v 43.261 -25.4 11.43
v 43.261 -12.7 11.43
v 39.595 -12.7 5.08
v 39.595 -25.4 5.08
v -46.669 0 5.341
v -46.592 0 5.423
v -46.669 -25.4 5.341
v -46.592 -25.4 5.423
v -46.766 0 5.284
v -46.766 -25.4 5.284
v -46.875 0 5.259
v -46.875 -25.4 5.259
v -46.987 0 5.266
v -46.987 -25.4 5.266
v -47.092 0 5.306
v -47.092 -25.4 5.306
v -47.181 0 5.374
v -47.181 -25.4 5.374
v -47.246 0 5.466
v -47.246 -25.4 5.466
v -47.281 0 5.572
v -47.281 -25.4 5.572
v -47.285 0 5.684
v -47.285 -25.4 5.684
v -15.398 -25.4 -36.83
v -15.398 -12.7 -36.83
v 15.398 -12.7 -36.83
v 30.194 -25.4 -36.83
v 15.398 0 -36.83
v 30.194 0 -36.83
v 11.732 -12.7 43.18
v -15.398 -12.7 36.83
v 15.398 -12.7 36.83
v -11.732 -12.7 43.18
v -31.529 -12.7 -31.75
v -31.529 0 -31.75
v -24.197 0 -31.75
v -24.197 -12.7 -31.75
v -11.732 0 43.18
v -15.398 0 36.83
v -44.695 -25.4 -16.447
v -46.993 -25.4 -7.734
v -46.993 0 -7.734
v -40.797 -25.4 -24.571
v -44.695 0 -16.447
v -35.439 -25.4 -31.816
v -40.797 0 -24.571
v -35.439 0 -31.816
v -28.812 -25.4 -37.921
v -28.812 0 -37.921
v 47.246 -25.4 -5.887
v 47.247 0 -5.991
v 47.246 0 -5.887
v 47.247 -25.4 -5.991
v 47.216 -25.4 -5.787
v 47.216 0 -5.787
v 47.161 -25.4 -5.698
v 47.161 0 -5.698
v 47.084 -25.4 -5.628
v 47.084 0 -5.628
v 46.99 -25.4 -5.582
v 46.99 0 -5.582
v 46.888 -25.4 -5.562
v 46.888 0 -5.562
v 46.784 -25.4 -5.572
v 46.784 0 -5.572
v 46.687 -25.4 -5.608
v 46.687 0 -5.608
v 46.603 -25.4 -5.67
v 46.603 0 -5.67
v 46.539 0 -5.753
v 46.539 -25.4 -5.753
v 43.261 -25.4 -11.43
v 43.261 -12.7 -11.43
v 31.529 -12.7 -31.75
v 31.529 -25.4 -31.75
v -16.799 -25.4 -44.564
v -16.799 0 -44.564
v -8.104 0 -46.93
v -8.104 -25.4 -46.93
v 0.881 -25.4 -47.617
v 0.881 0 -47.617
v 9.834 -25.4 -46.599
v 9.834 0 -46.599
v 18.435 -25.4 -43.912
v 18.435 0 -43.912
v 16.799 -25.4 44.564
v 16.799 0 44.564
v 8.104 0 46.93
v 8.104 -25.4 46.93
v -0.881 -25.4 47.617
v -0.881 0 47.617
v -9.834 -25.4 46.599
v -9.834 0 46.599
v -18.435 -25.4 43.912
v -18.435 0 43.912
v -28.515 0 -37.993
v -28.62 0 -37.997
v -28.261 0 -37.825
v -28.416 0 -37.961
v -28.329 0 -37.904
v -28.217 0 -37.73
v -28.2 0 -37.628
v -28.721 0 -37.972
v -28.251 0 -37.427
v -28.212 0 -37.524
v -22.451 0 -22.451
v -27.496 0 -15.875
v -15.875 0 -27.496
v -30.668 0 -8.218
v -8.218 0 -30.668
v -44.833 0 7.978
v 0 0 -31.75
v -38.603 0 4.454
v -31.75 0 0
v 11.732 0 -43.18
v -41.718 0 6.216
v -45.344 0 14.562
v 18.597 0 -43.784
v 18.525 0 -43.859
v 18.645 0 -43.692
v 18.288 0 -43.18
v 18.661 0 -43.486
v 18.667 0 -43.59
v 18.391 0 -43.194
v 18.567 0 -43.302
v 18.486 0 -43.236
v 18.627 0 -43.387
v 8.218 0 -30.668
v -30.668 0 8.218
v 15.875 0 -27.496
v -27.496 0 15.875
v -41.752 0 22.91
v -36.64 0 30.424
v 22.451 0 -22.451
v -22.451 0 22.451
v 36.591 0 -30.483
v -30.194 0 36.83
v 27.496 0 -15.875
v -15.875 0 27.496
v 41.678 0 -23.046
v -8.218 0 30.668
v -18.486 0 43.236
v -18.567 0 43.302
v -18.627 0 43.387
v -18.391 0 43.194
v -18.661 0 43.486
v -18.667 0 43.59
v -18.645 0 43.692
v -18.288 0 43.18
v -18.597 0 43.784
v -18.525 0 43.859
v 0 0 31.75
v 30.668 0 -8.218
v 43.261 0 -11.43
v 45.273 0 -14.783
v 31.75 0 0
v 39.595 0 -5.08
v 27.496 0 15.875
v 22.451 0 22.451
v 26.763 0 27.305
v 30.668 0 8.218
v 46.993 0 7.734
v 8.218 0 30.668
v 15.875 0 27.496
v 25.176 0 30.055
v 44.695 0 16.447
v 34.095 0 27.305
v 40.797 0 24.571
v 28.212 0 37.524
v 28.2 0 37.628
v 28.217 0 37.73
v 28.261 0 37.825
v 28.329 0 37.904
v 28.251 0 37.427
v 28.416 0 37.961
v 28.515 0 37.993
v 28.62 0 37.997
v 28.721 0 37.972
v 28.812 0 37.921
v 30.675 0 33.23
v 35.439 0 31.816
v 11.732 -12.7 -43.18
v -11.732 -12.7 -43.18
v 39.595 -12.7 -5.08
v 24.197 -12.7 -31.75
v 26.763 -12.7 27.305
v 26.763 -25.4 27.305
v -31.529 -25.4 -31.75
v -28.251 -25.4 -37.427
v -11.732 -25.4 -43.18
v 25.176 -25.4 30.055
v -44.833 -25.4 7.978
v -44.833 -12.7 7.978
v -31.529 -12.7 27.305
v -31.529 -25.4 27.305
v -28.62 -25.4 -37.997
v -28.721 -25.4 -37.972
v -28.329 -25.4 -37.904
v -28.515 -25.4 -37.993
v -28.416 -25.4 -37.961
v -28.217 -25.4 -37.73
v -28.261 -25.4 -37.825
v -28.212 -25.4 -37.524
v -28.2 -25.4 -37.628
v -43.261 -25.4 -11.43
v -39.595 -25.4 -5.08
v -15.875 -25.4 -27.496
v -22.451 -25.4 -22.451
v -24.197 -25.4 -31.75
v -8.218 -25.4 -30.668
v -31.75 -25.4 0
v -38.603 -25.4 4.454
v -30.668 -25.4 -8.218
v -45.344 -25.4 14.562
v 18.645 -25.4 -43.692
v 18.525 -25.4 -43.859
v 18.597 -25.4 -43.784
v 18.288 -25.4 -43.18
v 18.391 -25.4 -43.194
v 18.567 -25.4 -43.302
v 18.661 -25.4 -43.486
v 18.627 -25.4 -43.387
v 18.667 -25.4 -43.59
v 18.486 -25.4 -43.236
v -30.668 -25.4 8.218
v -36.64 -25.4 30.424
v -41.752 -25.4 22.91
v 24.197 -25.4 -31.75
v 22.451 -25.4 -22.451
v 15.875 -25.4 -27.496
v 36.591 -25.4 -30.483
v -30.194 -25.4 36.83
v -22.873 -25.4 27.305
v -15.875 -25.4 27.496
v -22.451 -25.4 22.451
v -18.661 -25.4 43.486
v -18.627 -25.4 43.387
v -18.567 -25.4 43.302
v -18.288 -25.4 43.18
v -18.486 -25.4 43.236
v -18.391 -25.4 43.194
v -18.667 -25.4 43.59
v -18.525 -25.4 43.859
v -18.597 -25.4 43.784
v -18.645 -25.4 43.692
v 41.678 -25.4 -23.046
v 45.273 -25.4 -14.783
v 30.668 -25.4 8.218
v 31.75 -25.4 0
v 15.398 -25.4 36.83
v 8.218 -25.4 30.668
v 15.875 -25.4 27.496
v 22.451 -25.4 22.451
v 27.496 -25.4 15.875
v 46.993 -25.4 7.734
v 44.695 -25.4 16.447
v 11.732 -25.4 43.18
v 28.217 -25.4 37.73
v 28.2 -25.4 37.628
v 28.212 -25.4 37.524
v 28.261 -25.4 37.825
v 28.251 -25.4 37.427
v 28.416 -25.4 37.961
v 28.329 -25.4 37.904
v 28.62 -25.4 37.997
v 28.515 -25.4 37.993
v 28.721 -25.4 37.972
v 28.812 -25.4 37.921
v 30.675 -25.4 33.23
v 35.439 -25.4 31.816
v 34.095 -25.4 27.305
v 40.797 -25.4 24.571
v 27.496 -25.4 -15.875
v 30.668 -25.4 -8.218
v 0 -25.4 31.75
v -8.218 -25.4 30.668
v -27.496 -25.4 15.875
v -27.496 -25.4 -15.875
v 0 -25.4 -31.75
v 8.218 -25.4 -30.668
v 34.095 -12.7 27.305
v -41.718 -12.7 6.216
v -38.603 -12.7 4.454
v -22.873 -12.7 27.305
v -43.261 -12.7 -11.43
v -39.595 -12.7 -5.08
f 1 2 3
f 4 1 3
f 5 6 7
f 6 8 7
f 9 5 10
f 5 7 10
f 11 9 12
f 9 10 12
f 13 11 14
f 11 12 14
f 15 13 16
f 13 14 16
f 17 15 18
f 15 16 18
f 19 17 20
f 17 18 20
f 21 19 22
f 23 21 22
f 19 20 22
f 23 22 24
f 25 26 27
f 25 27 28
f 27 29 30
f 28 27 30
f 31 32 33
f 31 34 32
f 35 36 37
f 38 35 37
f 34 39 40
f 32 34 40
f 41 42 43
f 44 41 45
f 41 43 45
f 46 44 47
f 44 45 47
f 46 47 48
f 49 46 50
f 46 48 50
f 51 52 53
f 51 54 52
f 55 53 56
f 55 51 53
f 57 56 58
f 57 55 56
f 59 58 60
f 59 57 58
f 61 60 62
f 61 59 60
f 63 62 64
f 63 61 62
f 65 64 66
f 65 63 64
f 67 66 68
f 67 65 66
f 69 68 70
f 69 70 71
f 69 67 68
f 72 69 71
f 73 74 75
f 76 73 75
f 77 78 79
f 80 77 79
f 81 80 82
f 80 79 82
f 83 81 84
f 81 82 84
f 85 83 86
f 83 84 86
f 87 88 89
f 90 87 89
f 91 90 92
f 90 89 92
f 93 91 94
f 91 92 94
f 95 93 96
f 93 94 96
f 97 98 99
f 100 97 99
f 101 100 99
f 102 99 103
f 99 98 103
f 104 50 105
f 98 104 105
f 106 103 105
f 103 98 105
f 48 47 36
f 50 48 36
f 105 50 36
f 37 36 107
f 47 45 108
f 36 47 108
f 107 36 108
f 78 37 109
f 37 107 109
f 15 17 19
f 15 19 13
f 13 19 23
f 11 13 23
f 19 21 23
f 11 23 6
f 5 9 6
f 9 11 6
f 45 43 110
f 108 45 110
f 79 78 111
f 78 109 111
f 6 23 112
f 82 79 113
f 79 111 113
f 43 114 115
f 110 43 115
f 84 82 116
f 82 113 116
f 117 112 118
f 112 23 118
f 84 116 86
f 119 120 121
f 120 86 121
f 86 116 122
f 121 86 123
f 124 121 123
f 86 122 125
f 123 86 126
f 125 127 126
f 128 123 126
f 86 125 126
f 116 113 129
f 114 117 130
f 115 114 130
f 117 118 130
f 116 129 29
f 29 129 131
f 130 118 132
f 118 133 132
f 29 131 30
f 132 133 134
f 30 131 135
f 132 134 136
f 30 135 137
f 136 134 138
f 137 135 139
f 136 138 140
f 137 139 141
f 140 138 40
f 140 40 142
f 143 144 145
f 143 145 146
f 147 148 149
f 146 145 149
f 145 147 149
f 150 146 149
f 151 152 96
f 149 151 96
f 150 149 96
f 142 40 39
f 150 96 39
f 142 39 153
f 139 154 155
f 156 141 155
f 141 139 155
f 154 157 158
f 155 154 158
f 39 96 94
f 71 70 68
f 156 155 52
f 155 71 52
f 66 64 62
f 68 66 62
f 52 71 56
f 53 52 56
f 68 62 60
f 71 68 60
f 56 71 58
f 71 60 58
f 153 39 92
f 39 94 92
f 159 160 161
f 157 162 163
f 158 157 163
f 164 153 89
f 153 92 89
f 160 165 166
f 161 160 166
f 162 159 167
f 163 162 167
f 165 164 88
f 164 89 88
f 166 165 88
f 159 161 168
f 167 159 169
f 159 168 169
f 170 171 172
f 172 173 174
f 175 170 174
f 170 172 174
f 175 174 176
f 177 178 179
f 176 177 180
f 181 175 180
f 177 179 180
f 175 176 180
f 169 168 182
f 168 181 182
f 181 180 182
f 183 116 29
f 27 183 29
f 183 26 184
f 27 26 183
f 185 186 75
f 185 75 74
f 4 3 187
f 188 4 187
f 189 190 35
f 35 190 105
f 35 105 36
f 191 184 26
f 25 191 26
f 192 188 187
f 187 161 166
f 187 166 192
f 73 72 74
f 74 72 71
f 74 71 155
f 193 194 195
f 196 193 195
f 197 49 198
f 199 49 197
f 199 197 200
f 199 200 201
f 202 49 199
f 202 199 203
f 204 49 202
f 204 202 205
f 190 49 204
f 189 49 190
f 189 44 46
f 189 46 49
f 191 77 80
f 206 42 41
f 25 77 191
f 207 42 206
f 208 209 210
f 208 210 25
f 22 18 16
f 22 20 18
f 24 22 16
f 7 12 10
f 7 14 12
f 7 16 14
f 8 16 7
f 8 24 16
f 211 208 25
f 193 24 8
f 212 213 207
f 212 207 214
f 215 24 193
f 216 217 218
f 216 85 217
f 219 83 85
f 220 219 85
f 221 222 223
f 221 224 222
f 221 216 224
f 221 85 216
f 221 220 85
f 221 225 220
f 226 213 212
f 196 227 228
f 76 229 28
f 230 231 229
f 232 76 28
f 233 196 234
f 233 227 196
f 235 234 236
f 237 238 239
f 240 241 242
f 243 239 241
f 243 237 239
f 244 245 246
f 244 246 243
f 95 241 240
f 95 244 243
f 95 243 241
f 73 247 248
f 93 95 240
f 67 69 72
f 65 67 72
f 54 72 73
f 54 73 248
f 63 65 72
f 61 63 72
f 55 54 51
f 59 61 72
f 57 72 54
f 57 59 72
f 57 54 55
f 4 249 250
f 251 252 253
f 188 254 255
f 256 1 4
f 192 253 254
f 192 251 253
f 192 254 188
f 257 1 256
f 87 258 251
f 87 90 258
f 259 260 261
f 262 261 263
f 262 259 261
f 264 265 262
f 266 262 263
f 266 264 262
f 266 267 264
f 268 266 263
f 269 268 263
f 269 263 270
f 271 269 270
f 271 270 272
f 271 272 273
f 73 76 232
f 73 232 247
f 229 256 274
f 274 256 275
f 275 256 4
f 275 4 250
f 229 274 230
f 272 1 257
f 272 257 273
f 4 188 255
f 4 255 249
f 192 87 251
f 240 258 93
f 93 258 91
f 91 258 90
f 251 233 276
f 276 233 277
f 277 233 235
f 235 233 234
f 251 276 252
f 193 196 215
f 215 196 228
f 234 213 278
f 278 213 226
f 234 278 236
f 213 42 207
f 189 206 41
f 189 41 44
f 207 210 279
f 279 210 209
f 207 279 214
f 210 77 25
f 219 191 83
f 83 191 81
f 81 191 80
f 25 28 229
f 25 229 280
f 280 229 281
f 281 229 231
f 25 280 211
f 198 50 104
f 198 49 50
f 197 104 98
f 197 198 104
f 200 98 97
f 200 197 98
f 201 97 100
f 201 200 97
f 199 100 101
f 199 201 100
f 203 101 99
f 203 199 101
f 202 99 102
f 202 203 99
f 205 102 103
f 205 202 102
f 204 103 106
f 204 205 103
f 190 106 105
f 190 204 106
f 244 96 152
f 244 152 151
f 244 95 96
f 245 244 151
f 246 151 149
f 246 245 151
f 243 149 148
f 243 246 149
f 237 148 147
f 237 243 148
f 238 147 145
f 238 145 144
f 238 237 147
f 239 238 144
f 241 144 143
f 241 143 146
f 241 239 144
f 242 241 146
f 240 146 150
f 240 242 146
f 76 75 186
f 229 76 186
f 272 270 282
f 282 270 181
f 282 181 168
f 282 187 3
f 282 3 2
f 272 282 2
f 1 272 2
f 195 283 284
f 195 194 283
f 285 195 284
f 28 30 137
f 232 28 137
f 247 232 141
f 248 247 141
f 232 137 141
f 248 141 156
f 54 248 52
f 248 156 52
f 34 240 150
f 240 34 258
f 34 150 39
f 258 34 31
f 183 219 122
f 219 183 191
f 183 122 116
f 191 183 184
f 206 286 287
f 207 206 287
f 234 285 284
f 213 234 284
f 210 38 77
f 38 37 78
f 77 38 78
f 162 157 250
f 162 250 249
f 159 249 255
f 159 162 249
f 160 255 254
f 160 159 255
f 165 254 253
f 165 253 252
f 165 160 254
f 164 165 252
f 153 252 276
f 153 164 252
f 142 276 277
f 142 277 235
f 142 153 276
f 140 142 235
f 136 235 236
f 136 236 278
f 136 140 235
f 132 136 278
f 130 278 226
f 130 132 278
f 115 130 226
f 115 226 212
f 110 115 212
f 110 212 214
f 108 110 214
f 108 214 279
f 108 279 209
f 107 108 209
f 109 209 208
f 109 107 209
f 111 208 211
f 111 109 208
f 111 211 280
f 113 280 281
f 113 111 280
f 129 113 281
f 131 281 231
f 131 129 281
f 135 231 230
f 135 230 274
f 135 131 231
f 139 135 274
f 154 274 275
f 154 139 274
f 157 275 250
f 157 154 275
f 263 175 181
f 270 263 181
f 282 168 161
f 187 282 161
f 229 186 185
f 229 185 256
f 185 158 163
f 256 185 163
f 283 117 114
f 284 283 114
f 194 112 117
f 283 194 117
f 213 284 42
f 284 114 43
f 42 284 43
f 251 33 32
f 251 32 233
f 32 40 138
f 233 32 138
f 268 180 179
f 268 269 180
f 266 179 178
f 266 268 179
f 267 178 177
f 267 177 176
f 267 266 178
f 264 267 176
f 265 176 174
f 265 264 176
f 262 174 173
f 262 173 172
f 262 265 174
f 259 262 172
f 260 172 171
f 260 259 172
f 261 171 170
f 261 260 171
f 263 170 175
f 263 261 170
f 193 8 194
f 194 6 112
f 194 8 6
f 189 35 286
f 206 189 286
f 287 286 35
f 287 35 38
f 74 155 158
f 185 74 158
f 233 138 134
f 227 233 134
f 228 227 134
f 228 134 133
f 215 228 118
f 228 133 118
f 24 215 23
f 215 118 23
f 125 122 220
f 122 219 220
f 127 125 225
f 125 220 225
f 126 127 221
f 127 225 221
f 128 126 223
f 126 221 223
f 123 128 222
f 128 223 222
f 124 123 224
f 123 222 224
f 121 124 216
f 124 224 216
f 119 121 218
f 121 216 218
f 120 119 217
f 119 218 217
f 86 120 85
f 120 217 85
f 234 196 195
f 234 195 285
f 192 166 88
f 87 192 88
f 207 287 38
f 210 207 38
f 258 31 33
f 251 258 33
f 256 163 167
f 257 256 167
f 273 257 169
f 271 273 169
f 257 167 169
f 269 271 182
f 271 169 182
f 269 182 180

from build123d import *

# Parameters (mm, degrees)
F0_R     = 31.75
F1_DEPTH = 25.4
F2_DEPTH = 12.7
F3_R     = 0.381


# Not quite as in the source:
# - a feature names something its author has since deleted; it is built from what else it names


with BuildPart() as f1:
    # F0 (on Front) → F1 (new body)
    with BuildSketch(Plane.XZ):
        with BuildLine():
            Line((15.3979316793, -36.83), (30.194233307, -36.83))
            ThreePointArc((30.194233307, -36.83), (42.108212504, -22.2494733583), (47.4402273678, -4.1911158763))
            Line((47.4402273678, -4.1911158763), (43.2608556704, -11.43))
            Line((43.2608556704, -11.43), (31.5290982004, -31.75))
            Line((31.5290982004, -31.75), (27.8629239911, -31.75))
            Line((27.8629239911, -31.75), (24.1967497817, -31.75))
            Line((24.1967497817, -31.75), (39.594681461, -5.08))
            Line((39.594681461, -5.08), (46.9928322749, 7.7339730917))
            ThreePointArc((46.9928322749, 7.7339730917), (40.3227154011, 25.3420450573), (27.349726503, 38.9888841237))
            Line((27.349726503, 38.9888841237), (30.6748353416, 33.2296266746))
            Line((30.6748353416, 33.2296266746), (34.095420147, 27.305))
            Line((34.095420147, 27.305), (43.2608556704, 11.43))
            Line((43.2608556704, 11.43), (41.4277685657, 8.255))
            Line((41.4277685657, 8.255), (39.594681461, 5.08))
            Line((39.594681461, 5.08), (26.7630717283, 27.305))
            Line((26.7630717283, 27.305), (25.1755740867, 30.0546265722))
            Line((25.1755740867, 30.0546265722), (16.7985989679, 44.5639730917))
            ThreePointArc((16.7985989679, 44.5639730917), (-1.7854971029, 47.5915184155), (-20.0905008648, 43.18))
            Line((-20.0905008648, 43.18), (-11.7317574699, 43.18))
            Line((-11.7317574699, 43.18), (11.7317574699, 43.18))
            Line((11.7317574699, 43.18), (13.5648445746, 40.005))
            Line((13.5648445746, 40.005), (15.3979316793, 36.83))
            Line((15.3979316793, 36.83), (-15.3979316793, 36.83))
            Line((-15.3979316793, 36.83), (-30.194233307, 36.83))
            ThreePointArc((-30.194233307, 36.83), (-42.108212504, 22.2494733583), (-47.4402273678, 4.1911158763))
            Line((-47.4402273678, 4.1911158763), (-44.833398728, 7.9780209084))
            Line((-44.833398728, 7.9780209084), (-31.5290982004, 27.305))
            Line((-31.5290982004, 27.305), (-27.2009059294, 27.305))
            Line((-27.2009059294, 27.305), (-22.8727136583, 27.305))
            Line((-22.8727136583, 27.305), (-38.6030217944, 4.4537921653))
            Line((-38.6030217944, 4.4537921653), (-46.9928322749, -7.7339730917))
            ThreePointArc((-46.9928322749, -7.7339730917), (-40.3227154011, -25.3420450573), (-27.349726503, -38.9888841237))
            Line((-27.349726503, -38.9888841237), (-31.5290982004, -31.75))
            Line((-31.5290982004, -31.75), (-43.2608556704, -11.43))
            Line((-43.2608556704, -11.43), (-41.4277685657, -8.255))
            Line((-41.4277685657, -8.255), (-39.594681461, -5.08))
            Line((-39.594681461, -5.08), (-24.1967497817, -31.75))
            Line((-24.1967497817, -31.75), (-16.7985989679, -44.5639730917))
            ThreePointArc((-16.7985989679, -44.5639730917), (1.7854971029, -47.5915184155), (20.0905008648, -43.18))
            Line((20.0905008648, -43.18), (11.7317574699, -43.18))
            Line((11.7317574699, -43.18), (-11.7317574699, -43.18))
            Line((-11.7317574699, -43.18), (-13.5648445746, -40.005))
            Line((-13.5648445746, -40.005), (-15.3979316793, -36.83))
            Line((-15.3979316793, -36.83), (15.3979316793, -36.83))
        make_face()
        Circle(F0_R, mode=Mode.SUBTRACT)
    extrude(amount=F1_DEPTH)

    # F0 (on Front) → F2 (join)
    with BuildSketch(Plane.XZ):
        Polygon((-41.7182102612, 6.2159065369), (-38.6030217944, 4.4537921653), (-22.8727136583, 27.305), (-27.2009059294, 27.305), align=None)
        Polygon((-44.833398728, 7.9780209084), (-41.7182102612, 6.2159065369), (-27.2009059294, 27.305), (-31.5290982004, 27.305), align=None)
        Polygon((-27.8629239911, -31.75), (-24.1967497817, -31.75), (-39.594681461, -5.08), (-41.4277685657, -8.255), align=None)
        Polygon((-31.5290982004, -31.75), (-27.8629239911, -31.75), (-41.4277685657, -8.255), (-43.2608556704, -11.43), align=None)
        Polygon((13.5648445746, -40.005), (15.3979316793, -36.83), (-15.3979316793, -36.83), (-13.5648445746, -40.005), align=None)
        Polygon((11.7317574699, -43.18), (13.5648445746, -40.005), (-13.5648445746, -40.005), (-11.7317574699, -43.18), align=None)
        Polygon((27.8629239911, -31.75), (41.4277685657, -8.255), (39.594681461, -5.08), (24.1967497817, -31.75), align=None)
        Polygon((31.5290982004, -31.75), (43.2608556704, -11.43), (41.4277685657, -8.255), (27.8629239911, -31.75), align=None)
        Polygon((43.2608556704, 11.43), (34.095420147, 27.305), (30.4292459376, 27.305), (41.4277685657, 8.255), align=None)
        Polygon((41.4277685657, 8.255), (30.4292459376, 27.305), (26.7630717283, 27.305), (39.594681461, 5.08), align=None)
        Polygon((13.5648445746, 40.005), (-13.5648445746, 40.005), (-15.3979316793, 36.83), (15.3979316793, 36.83), align=None)
        Polygon((11.7317574699, 43.18), (-11.7317574699, 43.18), (-13.5648445746, 40.005), (13.5648445746, 40.005), align=None)
    extrude(amount=F2_DEPTH)

    # F3
    f3_edges = [f1.edges().sort_by_distance(p)[0] for p in [
        (-47.440227, -12.7, 4.191116),
        (-27.349727, -12.7, -38.988884),
        (20.090501, -12.7, -43.18),
        (47.440227, -12.7, -4.191116),
        (27.349727, -12.7, 38.988884),
        (-20.090501, -12.7, 43.18),
    ]]
    fillet(f3_edges, radius=F3_R)


solid = f1.part
